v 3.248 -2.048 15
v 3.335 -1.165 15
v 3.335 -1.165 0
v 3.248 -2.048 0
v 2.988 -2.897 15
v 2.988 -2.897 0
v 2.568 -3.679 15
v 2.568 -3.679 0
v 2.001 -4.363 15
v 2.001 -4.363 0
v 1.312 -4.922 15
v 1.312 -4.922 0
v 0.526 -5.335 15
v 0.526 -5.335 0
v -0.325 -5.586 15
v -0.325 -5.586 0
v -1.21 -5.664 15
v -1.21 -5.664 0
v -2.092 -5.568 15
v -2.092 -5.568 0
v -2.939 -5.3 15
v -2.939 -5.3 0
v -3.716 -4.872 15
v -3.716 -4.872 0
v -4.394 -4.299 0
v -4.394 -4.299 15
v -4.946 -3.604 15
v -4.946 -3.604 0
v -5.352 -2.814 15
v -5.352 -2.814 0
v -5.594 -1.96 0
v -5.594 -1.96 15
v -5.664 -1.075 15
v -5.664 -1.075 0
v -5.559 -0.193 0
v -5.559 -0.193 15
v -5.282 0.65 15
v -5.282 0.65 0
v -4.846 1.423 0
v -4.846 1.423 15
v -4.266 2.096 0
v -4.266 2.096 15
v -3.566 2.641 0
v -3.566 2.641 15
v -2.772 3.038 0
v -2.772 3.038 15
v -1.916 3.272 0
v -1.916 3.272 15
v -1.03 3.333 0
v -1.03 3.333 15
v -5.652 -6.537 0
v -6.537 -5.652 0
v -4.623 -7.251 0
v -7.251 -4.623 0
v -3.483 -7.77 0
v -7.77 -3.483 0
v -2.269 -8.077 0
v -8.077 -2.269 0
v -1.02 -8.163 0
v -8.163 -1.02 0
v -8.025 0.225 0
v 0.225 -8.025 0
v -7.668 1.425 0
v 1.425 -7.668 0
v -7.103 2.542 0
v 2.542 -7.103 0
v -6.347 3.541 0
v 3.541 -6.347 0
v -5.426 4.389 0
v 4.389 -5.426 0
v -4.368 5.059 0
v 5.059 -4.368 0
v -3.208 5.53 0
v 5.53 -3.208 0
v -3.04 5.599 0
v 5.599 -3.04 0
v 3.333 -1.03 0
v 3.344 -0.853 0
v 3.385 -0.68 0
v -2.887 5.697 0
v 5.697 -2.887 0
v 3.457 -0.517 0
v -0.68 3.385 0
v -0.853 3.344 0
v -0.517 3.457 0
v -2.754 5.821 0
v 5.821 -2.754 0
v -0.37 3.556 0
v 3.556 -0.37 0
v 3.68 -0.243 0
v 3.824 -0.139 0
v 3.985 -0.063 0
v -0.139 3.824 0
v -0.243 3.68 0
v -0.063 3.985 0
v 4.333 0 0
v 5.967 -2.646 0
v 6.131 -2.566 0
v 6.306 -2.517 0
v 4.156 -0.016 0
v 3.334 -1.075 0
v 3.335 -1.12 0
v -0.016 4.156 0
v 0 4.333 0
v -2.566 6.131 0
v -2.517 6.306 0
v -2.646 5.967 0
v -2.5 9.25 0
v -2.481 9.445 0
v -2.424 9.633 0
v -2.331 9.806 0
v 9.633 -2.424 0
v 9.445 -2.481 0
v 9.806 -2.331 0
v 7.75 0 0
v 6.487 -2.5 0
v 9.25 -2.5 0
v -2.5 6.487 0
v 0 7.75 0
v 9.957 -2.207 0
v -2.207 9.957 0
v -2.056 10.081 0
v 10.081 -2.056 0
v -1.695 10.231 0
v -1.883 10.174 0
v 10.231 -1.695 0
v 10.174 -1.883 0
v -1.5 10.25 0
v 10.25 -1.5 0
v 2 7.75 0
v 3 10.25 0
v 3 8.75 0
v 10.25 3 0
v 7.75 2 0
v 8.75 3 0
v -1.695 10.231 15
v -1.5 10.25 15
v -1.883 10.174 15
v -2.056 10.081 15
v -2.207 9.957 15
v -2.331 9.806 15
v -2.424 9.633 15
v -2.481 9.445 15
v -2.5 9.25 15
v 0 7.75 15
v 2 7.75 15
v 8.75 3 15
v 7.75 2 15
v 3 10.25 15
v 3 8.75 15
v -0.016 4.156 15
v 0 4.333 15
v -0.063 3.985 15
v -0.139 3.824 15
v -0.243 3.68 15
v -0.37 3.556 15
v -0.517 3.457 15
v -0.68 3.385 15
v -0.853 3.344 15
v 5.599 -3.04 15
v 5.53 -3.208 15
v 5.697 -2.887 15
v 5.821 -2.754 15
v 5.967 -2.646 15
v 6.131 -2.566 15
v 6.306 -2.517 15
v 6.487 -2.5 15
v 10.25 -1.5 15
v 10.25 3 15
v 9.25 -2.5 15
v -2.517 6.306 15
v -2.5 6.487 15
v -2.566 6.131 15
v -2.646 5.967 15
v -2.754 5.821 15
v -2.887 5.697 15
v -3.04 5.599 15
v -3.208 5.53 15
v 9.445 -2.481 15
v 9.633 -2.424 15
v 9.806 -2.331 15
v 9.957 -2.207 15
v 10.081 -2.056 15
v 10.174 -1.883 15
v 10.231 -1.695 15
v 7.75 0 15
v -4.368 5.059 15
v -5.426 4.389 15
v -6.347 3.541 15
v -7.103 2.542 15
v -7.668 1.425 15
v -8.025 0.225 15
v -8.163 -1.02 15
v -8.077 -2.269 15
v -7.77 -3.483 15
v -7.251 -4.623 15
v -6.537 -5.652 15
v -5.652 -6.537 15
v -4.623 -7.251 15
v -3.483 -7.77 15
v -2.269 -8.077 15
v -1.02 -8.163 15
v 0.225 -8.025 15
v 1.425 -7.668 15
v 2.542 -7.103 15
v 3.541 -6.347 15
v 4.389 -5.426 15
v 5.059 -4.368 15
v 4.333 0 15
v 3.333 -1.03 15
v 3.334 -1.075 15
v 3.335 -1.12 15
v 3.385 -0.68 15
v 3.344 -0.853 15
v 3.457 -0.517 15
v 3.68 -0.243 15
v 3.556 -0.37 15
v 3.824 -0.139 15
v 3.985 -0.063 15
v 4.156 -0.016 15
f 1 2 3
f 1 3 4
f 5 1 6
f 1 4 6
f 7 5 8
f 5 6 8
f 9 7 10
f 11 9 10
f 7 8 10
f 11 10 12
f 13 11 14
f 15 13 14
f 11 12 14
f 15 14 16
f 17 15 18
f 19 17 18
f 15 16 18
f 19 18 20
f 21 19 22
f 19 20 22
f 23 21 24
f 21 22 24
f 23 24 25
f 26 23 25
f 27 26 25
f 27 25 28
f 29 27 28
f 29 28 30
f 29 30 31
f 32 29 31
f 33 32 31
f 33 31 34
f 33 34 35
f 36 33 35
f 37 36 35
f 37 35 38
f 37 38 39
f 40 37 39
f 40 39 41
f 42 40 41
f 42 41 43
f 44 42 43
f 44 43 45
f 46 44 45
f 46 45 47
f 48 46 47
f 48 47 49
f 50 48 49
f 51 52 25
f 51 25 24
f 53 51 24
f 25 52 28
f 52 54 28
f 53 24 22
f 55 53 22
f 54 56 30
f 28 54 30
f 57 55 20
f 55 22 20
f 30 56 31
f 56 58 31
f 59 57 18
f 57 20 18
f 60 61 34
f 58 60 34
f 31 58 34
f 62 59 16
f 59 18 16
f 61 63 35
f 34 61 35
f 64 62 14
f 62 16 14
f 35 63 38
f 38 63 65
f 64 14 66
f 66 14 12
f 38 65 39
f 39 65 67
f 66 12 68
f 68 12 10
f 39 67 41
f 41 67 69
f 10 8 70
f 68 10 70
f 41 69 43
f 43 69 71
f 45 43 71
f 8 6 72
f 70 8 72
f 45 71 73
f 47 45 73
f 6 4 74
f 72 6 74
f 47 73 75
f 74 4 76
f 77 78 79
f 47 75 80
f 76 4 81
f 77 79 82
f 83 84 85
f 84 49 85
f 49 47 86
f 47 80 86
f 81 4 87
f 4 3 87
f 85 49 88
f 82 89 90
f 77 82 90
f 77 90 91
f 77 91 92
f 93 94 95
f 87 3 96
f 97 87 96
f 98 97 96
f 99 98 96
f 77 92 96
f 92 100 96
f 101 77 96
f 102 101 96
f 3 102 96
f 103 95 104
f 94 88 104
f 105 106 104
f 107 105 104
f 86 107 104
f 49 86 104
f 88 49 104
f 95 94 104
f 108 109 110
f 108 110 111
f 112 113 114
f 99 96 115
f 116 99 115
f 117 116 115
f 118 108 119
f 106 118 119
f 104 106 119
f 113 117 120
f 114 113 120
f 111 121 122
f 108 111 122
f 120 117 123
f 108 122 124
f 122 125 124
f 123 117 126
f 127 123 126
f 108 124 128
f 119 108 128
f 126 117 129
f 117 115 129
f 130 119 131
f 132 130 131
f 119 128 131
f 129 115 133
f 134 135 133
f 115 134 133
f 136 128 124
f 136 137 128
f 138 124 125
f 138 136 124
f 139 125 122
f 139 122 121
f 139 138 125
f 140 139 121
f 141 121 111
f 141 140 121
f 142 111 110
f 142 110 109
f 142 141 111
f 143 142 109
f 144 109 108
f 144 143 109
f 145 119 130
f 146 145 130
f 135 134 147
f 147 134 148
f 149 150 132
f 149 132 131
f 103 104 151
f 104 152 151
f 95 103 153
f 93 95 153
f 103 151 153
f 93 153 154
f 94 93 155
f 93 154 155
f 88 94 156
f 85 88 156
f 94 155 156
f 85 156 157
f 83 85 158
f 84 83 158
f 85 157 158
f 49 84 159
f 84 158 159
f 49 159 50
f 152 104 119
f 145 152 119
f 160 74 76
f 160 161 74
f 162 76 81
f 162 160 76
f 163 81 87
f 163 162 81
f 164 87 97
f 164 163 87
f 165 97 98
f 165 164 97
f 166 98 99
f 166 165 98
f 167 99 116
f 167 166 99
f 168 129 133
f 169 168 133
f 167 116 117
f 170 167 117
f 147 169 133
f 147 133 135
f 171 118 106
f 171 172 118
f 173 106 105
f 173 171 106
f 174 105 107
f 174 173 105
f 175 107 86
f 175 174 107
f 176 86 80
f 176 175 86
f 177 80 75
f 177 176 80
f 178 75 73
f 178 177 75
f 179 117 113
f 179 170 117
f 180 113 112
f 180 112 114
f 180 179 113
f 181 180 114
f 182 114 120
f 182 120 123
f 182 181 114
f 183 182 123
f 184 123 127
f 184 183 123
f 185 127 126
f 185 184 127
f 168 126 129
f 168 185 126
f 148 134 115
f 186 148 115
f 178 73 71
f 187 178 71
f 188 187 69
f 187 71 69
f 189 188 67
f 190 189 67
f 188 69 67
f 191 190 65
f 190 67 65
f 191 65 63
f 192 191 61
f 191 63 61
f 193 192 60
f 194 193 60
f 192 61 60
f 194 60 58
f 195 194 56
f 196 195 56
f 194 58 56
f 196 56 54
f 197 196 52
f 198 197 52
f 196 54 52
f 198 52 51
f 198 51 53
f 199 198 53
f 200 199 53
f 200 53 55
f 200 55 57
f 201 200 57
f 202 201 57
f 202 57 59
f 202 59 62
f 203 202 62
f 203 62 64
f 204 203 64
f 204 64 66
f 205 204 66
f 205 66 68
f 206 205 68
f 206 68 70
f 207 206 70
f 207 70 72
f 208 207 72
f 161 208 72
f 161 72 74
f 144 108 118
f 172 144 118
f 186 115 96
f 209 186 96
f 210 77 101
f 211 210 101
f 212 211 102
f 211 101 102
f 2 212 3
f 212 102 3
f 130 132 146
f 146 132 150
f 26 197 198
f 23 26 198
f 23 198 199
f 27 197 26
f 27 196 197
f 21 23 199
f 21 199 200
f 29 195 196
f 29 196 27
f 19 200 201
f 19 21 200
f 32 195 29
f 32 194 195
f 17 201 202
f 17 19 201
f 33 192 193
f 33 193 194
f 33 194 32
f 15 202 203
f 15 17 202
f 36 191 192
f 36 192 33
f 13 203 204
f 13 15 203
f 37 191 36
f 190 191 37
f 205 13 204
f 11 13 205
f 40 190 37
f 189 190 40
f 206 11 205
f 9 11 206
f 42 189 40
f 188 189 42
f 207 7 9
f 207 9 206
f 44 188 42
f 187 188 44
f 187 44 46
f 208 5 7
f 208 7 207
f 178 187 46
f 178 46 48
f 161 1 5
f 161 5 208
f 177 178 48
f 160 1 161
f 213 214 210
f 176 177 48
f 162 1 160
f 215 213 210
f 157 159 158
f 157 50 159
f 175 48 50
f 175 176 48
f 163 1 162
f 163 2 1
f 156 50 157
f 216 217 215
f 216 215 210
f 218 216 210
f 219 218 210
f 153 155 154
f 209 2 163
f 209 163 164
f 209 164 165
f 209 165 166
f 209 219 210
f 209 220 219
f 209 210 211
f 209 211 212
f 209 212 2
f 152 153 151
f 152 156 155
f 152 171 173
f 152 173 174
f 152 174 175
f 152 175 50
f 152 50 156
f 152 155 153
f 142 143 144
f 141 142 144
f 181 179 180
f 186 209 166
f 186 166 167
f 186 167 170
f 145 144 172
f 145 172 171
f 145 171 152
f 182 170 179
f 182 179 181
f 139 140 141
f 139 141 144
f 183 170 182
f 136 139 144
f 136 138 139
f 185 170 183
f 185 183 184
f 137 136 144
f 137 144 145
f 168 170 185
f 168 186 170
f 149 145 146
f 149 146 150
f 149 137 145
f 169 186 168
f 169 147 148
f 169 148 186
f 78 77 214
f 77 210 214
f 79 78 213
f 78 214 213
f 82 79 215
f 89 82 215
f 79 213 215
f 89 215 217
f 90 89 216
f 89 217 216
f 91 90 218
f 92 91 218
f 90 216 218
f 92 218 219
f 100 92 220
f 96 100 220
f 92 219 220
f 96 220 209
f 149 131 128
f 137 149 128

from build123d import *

# Parameters (mm, degrees)
F1_DEPTH = 15
F2_SIZE  = 1
F3_R     = 1


with BuildPart() as f1:
    # F0 (on Top) → F1 (new body)
    with BuildSketch(Plane.XY):
        with BuildLine():
            ThreePointArc((-2.5, 5.706772), (-1.251394, 5.834777), (0, 5.737742))
            Line((0, 5.737742), (0, 7.75))
            Line((0, 7.75), (3, 7.75))
            Line((3, 7.75), (3, 10.25))
            Line((3, 10.25), (-2.5, 10.25))
            Line((-2.5, 10.25), (-2.5, 5.706772))
        make_face()
        with BuildLine():
            ThreePointArc((3.181981, 0), (3.296816, -0.577318), (3.335314, -1.164686))
            ThreePointArc((3.335314, -1.164686), (-4.734776, -3.904112), (0, 3.181981))
            Line((0, 3.181981), (0, 5.737742))
            ThreePointArc((0, 5.737742), (-1.251394, 5.834777), (-2.5, 5.706772))
            ThreePointArc((-2.5, 5.706772), (-6.114433, -6.114433), (5.706772, -2.5))
            ThreePointArc((5.706772, -2.5), (5.803105, -1.835429), (5.835314, -1.164686))
            ThreePointArc((5.835314, -1.164686), (5.810879, -0.580303), (5.737742, 0))
            Line((5.737742, 0), (3.181981, 0))
        make_face()
        with BuildLine():
            Line((7.75, 0), (5.737742, 0))
            ThreePointArc((5.737742, 0), (5.810879, -0.580303), (5.835314, -1.164686))
            ThreePointArc((5.835314, -1.164686), (5.803105, -1.835429), (5.706772, -2.5))
            Line((5.706772, -2.5), (10.25, -2.5))
            Line((10.25, -2.5), (10.25, 3))
            Line((10.25, 3), (7.75, 3))
            Line((7.75, 3), (7.75, 0))
        make_face()
    extrude(amount=F1_DEPTH)

    # F2
    f2_edges = [f1.edges().sort_by_distance(p)[0] for p in [
        (3, 7.75, 7.5),
        (7.75, 3, 7.5),
    ]]
    chamfer(f2_edges, length=F2_SIZE)

    # F3
    f3_edges = [f1.edges().sort_by_distance(p)[0] for p in [
        (10.25, -2.5, 7.5),
        (0, 3.181981, 7.5),
        (-2.5, 10.25, 7.5),
        (3.181981, 0, 7.5),
        (-2.5, 5.706772, 7.5),
        (5.706772, -2.5, 7.5),
    ]]
    fillet(f3_edges, radius=F3_R)


solid = f1.part
